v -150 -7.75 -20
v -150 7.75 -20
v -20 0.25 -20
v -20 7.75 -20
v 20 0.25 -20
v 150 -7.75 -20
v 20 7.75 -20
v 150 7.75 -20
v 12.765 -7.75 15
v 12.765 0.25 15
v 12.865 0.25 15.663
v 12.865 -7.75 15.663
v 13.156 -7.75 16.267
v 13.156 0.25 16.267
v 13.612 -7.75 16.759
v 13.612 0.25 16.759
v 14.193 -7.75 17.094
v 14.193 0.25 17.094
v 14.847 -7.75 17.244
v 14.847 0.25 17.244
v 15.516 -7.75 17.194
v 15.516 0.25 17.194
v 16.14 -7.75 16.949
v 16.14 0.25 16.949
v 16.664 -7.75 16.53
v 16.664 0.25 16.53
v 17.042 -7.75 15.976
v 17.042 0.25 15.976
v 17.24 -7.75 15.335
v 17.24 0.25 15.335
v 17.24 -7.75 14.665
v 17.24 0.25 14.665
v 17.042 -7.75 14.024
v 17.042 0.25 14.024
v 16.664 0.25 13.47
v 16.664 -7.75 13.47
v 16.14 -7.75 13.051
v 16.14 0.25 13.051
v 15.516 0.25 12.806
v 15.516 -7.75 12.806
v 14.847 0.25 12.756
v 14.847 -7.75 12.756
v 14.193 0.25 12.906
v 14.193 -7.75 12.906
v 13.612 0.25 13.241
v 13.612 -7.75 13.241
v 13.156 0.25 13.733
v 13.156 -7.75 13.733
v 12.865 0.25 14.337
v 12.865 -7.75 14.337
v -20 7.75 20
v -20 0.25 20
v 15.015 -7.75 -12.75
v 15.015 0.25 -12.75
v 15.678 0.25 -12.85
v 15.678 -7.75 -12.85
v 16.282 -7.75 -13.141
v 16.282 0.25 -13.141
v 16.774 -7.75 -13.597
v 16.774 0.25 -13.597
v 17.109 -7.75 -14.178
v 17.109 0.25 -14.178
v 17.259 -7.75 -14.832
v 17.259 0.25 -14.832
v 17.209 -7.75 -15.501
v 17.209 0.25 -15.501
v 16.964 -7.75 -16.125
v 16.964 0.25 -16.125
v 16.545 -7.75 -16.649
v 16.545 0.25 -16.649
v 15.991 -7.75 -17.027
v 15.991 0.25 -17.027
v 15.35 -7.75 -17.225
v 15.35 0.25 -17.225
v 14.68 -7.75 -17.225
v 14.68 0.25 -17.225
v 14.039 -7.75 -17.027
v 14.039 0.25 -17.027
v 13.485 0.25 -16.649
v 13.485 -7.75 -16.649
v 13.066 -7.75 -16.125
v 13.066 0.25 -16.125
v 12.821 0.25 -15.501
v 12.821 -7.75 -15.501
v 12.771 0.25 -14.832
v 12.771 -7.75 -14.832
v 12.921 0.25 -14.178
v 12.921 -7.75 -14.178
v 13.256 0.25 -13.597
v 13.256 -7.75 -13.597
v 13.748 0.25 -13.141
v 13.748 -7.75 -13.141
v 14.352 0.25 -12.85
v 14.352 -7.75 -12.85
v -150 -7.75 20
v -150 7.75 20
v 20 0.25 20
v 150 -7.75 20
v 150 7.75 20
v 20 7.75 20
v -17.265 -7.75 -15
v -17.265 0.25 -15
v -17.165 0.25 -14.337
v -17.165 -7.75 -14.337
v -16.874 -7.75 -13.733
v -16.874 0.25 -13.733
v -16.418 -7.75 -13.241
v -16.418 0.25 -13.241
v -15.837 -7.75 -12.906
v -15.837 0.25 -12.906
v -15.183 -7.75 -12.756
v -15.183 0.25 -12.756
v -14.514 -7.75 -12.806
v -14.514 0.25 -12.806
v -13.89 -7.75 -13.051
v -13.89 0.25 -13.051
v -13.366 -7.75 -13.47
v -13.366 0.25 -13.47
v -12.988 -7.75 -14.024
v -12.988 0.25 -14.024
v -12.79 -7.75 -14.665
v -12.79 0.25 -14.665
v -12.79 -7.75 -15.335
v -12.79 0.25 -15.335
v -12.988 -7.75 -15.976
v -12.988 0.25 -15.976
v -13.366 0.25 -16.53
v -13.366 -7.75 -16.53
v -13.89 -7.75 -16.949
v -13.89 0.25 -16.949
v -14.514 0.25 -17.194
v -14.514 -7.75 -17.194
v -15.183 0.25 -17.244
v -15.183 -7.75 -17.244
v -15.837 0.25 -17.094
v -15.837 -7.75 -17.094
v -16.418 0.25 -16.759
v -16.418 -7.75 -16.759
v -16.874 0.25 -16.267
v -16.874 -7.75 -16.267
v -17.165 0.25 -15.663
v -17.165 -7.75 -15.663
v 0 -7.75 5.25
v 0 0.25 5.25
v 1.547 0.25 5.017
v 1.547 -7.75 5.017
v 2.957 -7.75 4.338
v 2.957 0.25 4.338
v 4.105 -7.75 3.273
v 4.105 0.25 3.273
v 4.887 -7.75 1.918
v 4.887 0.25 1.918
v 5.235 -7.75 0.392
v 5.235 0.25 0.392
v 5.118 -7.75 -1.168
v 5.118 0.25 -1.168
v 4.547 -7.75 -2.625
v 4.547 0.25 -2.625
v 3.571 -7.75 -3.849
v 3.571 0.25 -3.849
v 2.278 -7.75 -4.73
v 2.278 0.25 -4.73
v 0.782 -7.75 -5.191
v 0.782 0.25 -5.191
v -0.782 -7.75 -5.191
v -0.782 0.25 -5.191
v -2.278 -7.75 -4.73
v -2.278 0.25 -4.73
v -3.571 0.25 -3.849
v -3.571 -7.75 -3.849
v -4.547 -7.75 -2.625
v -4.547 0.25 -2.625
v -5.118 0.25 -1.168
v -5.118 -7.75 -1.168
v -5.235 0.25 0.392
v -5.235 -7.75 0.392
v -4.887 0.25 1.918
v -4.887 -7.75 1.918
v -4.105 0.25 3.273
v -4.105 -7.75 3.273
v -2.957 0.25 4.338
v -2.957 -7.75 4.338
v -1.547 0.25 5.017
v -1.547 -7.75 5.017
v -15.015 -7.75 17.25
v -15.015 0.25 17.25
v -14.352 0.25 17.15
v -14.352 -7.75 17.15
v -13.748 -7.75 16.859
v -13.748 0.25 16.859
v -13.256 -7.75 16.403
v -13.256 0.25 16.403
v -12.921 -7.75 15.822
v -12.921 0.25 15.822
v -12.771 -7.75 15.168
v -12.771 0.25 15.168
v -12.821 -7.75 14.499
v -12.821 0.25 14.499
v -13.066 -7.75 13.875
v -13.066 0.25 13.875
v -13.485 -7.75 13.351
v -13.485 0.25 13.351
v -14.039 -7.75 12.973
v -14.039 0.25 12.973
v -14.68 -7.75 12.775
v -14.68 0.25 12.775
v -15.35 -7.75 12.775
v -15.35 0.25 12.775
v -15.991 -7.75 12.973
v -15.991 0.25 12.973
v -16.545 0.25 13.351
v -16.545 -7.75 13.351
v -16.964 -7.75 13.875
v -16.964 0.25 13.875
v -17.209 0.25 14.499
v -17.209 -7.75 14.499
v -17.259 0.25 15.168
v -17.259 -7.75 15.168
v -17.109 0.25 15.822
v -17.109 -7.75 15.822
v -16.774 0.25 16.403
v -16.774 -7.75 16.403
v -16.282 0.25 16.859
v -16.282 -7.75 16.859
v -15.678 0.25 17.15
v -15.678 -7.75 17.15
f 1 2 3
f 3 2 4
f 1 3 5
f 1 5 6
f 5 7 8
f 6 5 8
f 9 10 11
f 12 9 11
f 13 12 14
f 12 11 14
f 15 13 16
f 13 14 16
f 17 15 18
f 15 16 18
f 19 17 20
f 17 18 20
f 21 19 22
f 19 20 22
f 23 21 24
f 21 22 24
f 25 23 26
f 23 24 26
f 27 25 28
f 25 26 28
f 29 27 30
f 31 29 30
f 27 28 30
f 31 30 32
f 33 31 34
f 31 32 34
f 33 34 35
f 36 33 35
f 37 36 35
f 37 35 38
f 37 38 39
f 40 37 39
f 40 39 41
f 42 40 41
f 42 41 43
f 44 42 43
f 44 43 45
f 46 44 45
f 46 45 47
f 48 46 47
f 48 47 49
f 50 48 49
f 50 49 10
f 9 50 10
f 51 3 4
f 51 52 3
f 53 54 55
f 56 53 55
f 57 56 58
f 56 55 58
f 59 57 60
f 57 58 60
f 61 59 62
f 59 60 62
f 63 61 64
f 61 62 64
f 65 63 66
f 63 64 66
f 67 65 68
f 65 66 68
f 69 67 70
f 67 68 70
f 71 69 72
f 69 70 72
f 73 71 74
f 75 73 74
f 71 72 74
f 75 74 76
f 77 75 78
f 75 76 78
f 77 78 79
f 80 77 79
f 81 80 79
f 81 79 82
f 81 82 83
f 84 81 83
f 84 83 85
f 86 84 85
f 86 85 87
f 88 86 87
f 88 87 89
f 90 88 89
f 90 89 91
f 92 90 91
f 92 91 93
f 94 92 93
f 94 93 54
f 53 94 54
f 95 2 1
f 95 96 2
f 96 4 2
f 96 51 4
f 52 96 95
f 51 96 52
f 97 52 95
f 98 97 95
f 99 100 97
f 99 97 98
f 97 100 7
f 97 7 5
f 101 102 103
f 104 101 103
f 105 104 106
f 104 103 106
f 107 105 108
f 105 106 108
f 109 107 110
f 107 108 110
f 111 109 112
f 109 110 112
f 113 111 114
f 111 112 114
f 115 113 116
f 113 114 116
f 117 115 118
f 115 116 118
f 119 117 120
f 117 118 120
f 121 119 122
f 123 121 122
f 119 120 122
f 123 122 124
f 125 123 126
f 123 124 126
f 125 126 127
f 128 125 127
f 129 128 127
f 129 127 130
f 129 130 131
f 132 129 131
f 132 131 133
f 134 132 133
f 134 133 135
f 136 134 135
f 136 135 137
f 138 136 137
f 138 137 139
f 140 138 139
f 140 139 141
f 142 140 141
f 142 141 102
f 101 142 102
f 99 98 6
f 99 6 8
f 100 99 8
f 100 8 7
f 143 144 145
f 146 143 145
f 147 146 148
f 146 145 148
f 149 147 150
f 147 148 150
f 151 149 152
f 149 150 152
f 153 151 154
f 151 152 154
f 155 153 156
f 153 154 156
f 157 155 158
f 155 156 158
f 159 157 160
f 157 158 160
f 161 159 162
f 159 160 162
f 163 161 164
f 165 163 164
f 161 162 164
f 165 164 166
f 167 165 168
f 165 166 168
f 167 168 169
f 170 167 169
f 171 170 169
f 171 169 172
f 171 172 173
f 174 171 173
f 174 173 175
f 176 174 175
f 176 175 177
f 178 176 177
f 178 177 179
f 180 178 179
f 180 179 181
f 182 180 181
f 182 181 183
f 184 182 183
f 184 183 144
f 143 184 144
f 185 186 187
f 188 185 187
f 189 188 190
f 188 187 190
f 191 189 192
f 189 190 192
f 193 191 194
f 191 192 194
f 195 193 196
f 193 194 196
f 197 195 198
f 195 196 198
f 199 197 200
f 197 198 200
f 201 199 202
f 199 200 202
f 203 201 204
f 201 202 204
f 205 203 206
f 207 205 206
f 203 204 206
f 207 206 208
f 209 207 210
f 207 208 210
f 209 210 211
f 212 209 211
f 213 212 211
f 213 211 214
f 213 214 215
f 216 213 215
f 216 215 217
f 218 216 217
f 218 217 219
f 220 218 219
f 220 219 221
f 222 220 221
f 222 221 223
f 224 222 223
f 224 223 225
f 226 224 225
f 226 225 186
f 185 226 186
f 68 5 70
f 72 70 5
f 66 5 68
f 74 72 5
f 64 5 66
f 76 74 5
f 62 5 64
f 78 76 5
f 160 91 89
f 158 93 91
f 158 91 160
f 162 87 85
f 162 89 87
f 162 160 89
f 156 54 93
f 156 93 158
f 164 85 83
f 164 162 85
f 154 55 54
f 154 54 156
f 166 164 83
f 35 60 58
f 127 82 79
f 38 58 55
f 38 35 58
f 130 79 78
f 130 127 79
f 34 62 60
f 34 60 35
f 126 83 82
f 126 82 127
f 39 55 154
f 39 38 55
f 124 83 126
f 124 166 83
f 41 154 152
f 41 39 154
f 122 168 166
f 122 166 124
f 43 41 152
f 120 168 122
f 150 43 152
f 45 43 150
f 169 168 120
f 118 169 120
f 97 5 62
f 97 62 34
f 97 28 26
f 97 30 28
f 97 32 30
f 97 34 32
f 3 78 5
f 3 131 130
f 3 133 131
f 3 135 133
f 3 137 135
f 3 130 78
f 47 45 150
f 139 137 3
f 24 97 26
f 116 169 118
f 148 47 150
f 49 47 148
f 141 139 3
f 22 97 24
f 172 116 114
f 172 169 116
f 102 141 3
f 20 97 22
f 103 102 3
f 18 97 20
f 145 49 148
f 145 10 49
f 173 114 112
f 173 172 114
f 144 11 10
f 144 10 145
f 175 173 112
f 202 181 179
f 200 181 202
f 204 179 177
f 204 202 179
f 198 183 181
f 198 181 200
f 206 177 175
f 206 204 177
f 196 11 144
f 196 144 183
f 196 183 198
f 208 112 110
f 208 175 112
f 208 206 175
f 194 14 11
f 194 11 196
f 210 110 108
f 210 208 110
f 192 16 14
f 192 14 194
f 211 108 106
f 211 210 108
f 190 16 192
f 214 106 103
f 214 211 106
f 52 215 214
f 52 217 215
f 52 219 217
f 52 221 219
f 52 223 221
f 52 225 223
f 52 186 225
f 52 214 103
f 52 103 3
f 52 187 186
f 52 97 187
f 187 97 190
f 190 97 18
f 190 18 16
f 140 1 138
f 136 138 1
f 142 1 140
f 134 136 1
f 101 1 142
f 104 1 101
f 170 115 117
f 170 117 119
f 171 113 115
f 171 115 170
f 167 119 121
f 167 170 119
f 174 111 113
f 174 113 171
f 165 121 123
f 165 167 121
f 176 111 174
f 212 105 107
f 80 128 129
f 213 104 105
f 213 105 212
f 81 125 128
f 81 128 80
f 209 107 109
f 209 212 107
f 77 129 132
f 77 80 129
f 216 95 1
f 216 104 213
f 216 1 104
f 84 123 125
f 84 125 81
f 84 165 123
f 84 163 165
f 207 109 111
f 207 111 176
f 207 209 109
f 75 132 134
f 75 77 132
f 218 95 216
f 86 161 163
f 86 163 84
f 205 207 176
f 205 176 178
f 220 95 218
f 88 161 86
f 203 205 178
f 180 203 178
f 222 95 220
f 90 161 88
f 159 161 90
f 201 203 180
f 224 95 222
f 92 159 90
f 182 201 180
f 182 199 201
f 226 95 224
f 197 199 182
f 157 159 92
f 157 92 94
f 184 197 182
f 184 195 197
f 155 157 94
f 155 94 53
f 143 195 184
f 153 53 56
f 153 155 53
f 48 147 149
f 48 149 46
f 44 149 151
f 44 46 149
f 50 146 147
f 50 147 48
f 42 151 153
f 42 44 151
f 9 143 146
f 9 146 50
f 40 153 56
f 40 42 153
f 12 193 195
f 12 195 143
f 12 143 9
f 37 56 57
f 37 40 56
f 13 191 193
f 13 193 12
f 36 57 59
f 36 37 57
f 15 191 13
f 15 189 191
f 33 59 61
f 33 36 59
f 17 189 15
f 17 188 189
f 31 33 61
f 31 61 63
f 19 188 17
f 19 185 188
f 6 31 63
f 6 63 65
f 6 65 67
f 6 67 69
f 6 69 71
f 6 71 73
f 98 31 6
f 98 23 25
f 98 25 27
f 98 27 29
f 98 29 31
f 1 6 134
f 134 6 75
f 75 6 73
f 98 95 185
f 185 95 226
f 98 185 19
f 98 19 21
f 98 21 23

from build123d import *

# Parameters (mm, degrees)
BOSS_EXTRUDE1_DEPTH = 20
SKETCH2_R           = 2.25
SKETCH2_R_2         = 5.25
CUT_EXTRUDE1_DEPTH  = 40


with BuildPart() as part:
    # Sketch1 → Boss-Extrude1 (new, symmetric)
    with BuildSketch(Plane.XY):
        Polygon((-150, 7.75), (-150, -7.75), (150, -7.75), (150, 7.75), (20, 7.75), (20, 0.25), (-20, 0.25), (-20, 7.75), align=None)
    extrude(amount=BOSS_EXTRUDE1_DEPTH, both=True)

    # Sketch2 → Cut-Extrude1 (cut)
    with BuildSketch(Plane(origin=(0, 0.25, 0), x_dir=(1, 0, 0), z_dir=(0, 1, 0))):
        with Locations(Location((15.015, 15, 0), (0, 0, 270))):
            Circle(SKETCH2_R)
        with Locations(Location((-15.015, 15, 0), (0, 0, 180))):
            Circle(SKETCH2_R)
        with Locations(Location((15.015, -15, 0), (0, 0, 180))):
            Circle(SKETCH2_R)
        with Locations(Location((-15.015, -15, 0), (0, 0, 270))):
            Circle(SKETCH2_R)
        with Locations(Location((0, 0, 0), (0, 0, 270))):
            Circle(SKETCH2_R_2)
    extrude(amount=-CUT_EXTRUDE1_DEPTH, mode=Mode.SUBTRACT)


solid = part.part
